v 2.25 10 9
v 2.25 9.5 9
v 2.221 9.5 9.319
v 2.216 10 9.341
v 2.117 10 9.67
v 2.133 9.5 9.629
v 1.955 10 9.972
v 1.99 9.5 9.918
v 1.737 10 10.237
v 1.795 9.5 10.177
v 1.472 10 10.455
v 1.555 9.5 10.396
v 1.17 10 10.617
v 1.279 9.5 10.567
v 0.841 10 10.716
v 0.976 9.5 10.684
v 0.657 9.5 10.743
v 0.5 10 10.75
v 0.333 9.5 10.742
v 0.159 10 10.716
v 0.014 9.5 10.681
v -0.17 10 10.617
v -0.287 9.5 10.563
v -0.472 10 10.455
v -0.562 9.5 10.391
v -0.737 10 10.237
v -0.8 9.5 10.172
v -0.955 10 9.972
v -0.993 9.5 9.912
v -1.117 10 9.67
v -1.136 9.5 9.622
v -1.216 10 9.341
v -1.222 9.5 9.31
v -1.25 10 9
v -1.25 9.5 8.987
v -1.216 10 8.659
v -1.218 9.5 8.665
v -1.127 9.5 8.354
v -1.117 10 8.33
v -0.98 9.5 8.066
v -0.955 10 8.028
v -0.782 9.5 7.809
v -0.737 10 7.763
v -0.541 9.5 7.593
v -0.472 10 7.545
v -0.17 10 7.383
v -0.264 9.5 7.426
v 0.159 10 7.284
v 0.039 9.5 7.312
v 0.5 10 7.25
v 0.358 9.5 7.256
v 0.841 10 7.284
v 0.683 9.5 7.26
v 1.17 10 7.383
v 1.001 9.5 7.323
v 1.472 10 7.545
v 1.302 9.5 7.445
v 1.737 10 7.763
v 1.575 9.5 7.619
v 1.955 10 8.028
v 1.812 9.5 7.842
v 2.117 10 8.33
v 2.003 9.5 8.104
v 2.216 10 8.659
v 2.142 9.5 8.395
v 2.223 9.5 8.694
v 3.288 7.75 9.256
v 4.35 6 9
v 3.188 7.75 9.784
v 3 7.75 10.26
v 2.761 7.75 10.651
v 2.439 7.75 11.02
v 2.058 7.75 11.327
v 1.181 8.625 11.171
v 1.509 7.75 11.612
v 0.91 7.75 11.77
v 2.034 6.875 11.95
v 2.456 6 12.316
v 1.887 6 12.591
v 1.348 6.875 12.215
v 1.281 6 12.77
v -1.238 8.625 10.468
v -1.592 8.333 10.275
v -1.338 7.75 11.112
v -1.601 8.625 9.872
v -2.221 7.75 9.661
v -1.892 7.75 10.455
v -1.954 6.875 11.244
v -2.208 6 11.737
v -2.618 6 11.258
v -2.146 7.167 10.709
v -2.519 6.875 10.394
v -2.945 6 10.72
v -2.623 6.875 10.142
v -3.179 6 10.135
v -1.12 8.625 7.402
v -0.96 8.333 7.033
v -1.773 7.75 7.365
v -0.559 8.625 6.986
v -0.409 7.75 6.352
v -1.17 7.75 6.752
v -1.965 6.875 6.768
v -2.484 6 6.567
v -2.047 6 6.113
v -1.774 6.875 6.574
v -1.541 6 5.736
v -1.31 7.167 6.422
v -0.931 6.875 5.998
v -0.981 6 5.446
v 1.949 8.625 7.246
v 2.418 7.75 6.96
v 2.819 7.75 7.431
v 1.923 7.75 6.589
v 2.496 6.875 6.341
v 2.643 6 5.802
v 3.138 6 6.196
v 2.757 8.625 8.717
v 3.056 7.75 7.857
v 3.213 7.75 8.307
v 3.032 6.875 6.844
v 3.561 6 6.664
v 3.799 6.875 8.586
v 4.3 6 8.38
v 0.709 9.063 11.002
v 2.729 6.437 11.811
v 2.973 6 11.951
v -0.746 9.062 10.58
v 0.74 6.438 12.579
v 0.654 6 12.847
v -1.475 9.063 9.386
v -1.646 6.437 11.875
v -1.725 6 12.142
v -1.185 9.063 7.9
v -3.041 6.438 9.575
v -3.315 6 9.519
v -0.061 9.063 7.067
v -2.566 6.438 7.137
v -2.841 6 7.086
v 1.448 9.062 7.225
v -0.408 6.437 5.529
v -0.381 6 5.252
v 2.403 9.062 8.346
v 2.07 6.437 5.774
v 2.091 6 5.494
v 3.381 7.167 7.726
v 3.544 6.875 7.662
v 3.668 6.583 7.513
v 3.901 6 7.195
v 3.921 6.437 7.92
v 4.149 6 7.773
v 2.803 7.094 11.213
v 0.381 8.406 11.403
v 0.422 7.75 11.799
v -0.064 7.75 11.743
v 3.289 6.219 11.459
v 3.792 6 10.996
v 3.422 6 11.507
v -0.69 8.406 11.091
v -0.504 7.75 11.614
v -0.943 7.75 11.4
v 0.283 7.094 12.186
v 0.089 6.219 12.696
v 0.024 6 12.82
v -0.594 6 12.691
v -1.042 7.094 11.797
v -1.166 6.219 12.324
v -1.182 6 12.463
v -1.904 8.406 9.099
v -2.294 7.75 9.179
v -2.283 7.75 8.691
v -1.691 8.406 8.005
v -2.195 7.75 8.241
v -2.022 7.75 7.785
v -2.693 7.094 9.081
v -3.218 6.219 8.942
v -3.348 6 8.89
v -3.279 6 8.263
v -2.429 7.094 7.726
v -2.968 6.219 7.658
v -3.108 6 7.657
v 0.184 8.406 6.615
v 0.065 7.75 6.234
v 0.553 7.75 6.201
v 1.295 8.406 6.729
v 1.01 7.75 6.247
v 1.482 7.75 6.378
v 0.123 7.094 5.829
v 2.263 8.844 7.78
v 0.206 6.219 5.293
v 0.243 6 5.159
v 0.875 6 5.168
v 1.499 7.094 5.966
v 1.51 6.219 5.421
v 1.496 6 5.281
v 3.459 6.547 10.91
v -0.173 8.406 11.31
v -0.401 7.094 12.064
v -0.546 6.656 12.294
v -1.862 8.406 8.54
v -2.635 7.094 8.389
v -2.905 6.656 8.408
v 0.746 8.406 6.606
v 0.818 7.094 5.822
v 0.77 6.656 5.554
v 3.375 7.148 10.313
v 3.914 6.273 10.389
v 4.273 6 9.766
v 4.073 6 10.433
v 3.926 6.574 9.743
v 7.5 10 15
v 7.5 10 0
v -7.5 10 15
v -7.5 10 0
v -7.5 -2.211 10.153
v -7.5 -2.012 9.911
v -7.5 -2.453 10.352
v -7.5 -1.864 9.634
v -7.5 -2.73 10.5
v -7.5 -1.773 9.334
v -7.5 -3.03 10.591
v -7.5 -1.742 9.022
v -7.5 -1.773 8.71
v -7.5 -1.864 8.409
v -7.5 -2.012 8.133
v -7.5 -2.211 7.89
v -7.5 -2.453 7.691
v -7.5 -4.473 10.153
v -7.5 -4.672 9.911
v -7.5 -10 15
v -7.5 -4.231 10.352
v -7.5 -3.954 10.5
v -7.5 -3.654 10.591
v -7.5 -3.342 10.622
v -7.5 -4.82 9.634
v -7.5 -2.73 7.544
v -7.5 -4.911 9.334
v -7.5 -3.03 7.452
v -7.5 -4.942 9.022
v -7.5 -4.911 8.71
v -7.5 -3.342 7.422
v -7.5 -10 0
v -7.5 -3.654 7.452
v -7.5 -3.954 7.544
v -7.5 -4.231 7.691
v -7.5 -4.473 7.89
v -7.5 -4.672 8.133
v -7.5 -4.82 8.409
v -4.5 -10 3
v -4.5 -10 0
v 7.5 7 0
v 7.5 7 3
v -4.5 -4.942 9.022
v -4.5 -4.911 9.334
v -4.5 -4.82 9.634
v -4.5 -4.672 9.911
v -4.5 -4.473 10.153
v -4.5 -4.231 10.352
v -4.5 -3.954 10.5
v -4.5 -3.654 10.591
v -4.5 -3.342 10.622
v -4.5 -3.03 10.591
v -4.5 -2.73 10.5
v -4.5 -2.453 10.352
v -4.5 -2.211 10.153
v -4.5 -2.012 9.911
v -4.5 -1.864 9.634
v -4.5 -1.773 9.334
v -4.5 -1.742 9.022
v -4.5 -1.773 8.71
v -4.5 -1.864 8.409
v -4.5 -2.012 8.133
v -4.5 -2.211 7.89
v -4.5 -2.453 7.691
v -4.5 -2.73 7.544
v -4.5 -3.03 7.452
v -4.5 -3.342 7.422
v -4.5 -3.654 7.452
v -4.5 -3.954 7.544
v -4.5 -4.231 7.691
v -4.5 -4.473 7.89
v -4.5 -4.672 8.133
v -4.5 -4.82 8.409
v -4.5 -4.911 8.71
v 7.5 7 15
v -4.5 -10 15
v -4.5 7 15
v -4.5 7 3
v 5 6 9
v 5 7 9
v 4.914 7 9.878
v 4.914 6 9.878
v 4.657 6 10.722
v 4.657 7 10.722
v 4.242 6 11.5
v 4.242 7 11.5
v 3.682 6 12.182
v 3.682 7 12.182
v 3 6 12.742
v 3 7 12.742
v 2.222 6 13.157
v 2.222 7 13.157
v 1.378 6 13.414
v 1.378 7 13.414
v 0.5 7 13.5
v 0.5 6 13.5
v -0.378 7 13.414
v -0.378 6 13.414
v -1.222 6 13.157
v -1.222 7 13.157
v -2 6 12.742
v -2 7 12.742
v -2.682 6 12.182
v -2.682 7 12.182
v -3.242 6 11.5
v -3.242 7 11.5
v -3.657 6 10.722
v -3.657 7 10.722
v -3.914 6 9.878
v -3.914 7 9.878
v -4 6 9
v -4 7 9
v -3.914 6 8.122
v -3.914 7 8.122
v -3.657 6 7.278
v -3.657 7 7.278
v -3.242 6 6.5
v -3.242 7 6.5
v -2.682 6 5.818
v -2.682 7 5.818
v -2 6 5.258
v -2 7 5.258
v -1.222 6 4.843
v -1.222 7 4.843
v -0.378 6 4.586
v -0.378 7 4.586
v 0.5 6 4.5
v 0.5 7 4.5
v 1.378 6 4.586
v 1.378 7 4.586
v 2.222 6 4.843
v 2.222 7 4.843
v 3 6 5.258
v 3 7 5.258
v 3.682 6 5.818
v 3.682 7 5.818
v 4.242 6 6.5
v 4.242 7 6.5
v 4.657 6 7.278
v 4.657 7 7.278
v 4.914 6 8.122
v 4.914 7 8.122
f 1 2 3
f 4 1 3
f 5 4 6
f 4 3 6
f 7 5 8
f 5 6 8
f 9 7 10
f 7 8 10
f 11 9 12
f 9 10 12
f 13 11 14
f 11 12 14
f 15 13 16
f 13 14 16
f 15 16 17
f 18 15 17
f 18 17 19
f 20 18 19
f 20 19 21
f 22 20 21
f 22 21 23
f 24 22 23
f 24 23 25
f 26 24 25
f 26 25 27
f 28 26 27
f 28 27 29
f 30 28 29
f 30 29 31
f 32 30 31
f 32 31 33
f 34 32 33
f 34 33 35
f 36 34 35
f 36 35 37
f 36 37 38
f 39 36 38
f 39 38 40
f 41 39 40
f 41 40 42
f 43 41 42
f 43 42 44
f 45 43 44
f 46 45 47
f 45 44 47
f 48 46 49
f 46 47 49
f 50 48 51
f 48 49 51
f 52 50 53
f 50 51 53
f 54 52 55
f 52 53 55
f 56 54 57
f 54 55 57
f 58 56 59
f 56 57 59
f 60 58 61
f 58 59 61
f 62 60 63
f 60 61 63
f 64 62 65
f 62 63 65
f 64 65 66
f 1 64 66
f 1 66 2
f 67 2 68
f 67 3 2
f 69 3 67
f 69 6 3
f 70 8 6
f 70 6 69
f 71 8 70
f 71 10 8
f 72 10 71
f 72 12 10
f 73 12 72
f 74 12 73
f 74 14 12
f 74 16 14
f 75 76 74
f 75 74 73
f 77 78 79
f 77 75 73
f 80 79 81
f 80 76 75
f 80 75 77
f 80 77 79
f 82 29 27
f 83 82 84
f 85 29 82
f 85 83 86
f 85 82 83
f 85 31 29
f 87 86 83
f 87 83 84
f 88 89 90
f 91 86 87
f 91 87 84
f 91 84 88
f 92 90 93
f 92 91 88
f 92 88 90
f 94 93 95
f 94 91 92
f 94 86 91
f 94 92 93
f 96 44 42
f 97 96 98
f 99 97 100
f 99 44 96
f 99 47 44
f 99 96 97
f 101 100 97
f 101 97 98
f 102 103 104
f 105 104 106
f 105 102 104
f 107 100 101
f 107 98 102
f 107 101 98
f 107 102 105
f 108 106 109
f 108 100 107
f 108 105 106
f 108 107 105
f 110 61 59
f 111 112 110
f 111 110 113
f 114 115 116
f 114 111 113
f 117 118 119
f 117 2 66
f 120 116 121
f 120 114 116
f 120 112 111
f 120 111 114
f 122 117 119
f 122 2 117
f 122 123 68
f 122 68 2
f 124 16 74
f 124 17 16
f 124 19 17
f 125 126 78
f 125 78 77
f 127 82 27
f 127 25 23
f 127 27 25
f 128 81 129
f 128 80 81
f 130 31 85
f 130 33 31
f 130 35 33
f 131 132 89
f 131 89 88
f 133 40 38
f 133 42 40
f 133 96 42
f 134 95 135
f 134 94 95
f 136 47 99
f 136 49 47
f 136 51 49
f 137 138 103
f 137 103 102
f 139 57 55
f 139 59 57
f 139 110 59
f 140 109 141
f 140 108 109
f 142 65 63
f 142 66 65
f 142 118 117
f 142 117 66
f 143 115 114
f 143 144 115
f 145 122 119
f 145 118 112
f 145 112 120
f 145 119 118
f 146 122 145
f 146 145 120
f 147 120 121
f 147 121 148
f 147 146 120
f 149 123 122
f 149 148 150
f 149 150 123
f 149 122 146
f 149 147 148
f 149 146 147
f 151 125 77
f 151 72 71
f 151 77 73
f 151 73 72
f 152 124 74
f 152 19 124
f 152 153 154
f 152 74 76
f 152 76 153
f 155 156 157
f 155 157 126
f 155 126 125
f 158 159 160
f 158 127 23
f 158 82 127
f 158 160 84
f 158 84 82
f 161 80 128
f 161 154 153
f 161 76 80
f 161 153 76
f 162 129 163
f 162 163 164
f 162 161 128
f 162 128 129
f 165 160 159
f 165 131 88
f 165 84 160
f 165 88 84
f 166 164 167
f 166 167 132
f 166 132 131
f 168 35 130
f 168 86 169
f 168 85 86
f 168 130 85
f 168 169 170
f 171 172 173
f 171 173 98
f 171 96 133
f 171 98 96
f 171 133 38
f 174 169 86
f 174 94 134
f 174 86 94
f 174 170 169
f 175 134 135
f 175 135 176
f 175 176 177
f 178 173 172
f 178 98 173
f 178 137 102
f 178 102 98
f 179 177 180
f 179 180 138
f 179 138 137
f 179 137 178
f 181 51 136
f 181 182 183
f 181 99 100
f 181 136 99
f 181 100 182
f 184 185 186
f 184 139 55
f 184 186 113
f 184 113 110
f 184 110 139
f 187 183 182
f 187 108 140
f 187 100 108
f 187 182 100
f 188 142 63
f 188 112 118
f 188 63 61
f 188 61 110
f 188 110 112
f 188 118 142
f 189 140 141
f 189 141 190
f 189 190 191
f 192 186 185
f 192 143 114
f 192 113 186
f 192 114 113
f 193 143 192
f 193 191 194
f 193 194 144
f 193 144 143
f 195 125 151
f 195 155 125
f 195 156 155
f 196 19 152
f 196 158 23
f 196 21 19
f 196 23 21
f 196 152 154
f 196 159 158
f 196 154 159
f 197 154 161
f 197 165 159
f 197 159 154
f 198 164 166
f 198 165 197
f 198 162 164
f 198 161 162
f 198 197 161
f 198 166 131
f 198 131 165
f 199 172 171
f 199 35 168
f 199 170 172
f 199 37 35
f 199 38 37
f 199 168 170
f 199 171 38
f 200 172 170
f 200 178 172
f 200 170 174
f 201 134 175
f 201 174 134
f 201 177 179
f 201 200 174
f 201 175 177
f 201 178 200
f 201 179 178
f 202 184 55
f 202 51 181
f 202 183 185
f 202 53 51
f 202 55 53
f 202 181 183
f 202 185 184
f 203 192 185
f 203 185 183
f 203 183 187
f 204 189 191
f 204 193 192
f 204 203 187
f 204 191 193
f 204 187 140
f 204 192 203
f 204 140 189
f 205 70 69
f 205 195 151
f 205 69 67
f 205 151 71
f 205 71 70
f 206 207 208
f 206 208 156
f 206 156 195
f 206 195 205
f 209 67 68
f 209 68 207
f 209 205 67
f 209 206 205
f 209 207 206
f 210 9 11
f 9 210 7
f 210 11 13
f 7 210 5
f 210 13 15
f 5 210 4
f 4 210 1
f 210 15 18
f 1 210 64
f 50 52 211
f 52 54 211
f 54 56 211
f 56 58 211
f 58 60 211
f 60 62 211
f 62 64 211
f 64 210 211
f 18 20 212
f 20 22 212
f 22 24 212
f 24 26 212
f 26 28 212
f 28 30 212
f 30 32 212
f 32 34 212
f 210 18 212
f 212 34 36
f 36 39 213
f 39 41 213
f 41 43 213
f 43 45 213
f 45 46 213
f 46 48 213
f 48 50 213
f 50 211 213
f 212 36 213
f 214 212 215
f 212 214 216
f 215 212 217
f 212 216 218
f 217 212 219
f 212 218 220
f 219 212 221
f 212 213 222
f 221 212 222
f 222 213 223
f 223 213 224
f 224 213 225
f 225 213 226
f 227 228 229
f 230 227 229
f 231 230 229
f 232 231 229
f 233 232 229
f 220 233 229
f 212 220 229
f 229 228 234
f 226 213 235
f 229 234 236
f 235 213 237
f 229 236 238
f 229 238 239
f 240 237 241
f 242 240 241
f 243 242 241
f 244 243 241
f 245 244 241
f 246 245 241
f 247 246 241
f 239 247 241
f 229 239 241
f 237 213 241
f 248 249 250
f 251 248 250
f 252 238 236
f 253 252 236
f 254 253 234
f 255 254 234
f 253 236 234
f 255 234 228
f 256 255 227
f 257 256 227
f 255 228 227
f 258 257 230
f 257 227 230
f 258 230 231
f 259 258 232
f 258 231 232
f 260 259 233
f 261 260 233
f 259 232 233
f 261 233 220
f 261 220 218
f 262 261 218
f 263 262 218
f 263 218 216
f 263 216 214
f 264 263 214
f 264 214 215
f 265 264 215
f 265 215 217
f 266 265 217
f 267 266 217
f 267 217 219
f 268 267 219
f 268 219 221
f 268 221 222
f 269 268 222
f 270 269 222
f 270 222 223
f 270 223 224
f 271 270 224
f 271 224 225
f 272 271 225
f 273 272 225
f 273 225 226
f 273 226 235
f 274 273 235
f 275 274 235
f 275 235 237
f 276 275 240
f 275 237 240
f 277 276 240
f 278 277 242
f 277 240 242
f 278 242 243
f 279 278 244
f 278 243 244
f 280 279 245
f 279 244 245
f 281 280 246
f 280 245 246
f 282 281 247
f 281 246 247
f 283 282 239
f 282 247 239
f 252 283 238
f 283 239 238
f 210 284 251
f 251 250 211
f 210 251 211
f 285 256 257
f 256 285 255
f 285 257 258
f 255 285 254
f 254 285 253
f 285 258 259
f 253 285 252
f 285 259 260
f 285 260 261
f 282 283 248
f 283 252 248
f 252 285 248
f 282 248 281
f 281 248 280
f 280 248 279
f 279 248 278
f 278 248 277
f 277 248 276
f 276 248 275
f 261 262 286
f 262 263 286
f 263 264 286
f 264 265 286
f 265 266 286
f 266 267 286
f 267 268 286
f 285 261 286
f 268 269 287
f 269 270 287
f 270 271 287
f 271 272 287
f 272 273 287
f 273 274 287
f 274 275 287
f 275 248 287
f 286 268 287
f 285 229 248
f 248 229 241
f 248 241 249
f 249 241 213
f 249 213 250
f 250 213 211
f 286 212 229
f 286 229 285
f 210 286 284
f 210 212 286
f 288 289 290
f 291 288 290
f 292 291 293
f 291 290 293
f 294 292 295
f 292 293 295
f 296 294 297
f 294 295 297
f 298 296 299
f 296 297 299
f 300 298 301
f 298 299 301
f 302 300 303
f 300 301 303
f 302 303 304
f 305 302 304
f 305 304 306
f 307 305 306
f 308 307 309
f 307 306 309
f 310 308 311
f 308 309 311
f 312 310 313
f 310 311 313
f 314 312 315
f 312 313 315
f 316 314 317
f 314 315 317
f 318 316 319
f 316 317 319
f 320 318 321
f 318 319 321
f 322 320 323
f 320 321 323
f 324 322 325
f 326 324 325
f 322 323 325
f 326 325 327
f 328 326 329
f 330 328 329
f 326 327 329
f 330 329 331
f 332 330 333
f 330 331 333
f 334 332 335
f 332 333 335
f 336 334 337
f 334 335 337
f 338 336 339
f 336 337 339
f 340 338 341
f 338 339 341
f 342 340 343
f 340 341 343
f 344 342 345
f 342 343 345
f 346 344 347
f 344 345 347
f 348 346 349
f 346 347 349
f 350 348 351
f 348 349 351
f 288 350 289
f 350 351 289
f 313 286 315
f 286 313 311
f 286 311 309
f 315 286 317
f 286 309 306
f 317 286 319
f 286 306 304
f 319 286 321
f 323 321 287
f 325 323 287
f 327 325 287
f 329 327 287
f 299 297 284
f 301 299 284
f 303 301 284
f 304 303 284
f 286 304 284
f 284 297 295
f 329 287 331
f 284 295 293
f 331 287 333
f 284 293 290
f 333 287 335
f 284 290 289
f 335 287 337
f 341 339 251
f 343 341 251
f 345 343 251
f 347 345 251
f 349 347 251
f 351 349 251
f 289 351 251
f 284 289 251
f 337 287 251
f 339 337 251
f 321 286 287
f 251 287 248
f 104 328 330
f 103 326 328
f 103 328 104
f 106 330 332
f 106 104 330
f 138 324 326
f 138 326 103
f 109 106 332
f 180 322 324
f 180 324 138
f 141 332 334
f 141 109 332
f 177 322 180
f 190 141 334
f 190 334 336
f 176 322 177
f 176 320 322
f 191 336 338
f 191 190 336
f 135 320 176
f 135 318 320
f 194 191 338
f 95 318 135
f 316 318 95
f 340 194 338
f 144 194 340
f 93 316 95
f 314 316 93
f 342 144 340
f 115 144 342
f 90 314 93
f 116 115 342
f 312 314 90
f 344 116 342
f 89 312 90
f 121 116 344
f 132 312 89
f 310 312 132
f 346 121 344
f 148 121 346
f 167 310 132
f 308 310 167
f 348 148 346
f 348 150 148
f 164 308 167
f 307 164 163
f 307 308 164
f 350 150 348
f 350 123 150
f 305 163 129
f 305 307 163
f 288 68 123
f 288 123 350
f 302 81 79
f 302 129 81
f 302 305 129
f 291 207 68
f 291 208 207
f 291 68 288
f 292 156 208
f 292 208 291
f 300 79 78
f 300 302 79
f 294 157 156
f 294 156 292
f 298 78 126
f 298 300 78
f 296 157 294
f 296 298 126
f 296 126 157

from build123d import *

# Parameters (mm, degrees)
F1_DEPTH = 3
F0_W     = 12
F0_H     = 3
F0_W_2   = 3
F0_H_2   = 17
F2_DEPTH = 15
F3_R     = 1.75
F4_DEPTH = 25
F3_R_2   = 4.5
F3_R_3   = 3.5
F5_DEPTH = 1
F6_DEPTH = 1
F7_SIZE2 = 2.1
F7_SIZE  = 3.5
F8_R     = 1.6
F9_DEPTH = 25


with BuildPart() as f1:
    # F0 (on Top) → F1 (new body)
    with BuildSketch(Plane.XY):
        Polygon((-4.5, -10), (7.5, 7), (-4.5, 7), align=None)
    extrude(amount=F1_DEPTH)

    # F0 (on Top) → F2 (join)
    with BuildSketch(Plane.XY):
        with Locations((1.5, 8.5)):
            Rectangle(F0_W, F0_H)
        with Locations((-6, 8.5)):
            Rectangle(F0_W_2, F0_H)
        with Locations((-6, -1.5)):
            Rectangle(F0_W_2, F0_H_2)
    extrude(amount=F2_DEPTH)

    # F3 (on face) → F4 (cut)
    with BuildSketch(Plane.XZ.offset(-7)):
        with Locations((0.5, 9)):
            Circle(F3_R)
    extrude(amount=-F4_DEPTH, mode=Mode.SUBTRACT)

    # F3 (on face) → F5 (join)
    with BuildSketch(Plane.XZ.offset(-7)):
        with Locations((0.5, 9)):
            Circle(F3_R_2)
        with Locations((0.5, 9)):
            Circle(F3_R_3, mode=Mode.SUBTRACT)
    extrude(amount=F5_DEPTH)

    # F3 (on face) → F6 (join)
    with BuildSketch(Plane.XZ.offset(-7)):
        with Locations((0.5, 9)):
            Circle(F3_R_3)
        with Locations((0.5, 9)):
            Circle(F3_R, mode=Mode.SUBTRACT)
    extrude(amount=F6_DEPTH)

    # F7
    f7_edges = [f1.edges().sort_by_distance(p)[0] for p in [
        (-1.25, 6, 9),
    ]]
    chamfer(f7_edges, length=F7_SIZE, length2=F7_SIZE2)

    # F8 (on face) → F9 (cut)
    with BuildSketch(Plane(origin=(-7.5, 0, 0), x_dir=(0, -1, 0), z_dir=(-1, 0, 0))):
        with Locations((3.342046, 9.021713)):
            Circle(F8_R)
    extrude(amount=-F9_DEPTH, mode=Mode.SUBTRACT)


solid = f1.part
